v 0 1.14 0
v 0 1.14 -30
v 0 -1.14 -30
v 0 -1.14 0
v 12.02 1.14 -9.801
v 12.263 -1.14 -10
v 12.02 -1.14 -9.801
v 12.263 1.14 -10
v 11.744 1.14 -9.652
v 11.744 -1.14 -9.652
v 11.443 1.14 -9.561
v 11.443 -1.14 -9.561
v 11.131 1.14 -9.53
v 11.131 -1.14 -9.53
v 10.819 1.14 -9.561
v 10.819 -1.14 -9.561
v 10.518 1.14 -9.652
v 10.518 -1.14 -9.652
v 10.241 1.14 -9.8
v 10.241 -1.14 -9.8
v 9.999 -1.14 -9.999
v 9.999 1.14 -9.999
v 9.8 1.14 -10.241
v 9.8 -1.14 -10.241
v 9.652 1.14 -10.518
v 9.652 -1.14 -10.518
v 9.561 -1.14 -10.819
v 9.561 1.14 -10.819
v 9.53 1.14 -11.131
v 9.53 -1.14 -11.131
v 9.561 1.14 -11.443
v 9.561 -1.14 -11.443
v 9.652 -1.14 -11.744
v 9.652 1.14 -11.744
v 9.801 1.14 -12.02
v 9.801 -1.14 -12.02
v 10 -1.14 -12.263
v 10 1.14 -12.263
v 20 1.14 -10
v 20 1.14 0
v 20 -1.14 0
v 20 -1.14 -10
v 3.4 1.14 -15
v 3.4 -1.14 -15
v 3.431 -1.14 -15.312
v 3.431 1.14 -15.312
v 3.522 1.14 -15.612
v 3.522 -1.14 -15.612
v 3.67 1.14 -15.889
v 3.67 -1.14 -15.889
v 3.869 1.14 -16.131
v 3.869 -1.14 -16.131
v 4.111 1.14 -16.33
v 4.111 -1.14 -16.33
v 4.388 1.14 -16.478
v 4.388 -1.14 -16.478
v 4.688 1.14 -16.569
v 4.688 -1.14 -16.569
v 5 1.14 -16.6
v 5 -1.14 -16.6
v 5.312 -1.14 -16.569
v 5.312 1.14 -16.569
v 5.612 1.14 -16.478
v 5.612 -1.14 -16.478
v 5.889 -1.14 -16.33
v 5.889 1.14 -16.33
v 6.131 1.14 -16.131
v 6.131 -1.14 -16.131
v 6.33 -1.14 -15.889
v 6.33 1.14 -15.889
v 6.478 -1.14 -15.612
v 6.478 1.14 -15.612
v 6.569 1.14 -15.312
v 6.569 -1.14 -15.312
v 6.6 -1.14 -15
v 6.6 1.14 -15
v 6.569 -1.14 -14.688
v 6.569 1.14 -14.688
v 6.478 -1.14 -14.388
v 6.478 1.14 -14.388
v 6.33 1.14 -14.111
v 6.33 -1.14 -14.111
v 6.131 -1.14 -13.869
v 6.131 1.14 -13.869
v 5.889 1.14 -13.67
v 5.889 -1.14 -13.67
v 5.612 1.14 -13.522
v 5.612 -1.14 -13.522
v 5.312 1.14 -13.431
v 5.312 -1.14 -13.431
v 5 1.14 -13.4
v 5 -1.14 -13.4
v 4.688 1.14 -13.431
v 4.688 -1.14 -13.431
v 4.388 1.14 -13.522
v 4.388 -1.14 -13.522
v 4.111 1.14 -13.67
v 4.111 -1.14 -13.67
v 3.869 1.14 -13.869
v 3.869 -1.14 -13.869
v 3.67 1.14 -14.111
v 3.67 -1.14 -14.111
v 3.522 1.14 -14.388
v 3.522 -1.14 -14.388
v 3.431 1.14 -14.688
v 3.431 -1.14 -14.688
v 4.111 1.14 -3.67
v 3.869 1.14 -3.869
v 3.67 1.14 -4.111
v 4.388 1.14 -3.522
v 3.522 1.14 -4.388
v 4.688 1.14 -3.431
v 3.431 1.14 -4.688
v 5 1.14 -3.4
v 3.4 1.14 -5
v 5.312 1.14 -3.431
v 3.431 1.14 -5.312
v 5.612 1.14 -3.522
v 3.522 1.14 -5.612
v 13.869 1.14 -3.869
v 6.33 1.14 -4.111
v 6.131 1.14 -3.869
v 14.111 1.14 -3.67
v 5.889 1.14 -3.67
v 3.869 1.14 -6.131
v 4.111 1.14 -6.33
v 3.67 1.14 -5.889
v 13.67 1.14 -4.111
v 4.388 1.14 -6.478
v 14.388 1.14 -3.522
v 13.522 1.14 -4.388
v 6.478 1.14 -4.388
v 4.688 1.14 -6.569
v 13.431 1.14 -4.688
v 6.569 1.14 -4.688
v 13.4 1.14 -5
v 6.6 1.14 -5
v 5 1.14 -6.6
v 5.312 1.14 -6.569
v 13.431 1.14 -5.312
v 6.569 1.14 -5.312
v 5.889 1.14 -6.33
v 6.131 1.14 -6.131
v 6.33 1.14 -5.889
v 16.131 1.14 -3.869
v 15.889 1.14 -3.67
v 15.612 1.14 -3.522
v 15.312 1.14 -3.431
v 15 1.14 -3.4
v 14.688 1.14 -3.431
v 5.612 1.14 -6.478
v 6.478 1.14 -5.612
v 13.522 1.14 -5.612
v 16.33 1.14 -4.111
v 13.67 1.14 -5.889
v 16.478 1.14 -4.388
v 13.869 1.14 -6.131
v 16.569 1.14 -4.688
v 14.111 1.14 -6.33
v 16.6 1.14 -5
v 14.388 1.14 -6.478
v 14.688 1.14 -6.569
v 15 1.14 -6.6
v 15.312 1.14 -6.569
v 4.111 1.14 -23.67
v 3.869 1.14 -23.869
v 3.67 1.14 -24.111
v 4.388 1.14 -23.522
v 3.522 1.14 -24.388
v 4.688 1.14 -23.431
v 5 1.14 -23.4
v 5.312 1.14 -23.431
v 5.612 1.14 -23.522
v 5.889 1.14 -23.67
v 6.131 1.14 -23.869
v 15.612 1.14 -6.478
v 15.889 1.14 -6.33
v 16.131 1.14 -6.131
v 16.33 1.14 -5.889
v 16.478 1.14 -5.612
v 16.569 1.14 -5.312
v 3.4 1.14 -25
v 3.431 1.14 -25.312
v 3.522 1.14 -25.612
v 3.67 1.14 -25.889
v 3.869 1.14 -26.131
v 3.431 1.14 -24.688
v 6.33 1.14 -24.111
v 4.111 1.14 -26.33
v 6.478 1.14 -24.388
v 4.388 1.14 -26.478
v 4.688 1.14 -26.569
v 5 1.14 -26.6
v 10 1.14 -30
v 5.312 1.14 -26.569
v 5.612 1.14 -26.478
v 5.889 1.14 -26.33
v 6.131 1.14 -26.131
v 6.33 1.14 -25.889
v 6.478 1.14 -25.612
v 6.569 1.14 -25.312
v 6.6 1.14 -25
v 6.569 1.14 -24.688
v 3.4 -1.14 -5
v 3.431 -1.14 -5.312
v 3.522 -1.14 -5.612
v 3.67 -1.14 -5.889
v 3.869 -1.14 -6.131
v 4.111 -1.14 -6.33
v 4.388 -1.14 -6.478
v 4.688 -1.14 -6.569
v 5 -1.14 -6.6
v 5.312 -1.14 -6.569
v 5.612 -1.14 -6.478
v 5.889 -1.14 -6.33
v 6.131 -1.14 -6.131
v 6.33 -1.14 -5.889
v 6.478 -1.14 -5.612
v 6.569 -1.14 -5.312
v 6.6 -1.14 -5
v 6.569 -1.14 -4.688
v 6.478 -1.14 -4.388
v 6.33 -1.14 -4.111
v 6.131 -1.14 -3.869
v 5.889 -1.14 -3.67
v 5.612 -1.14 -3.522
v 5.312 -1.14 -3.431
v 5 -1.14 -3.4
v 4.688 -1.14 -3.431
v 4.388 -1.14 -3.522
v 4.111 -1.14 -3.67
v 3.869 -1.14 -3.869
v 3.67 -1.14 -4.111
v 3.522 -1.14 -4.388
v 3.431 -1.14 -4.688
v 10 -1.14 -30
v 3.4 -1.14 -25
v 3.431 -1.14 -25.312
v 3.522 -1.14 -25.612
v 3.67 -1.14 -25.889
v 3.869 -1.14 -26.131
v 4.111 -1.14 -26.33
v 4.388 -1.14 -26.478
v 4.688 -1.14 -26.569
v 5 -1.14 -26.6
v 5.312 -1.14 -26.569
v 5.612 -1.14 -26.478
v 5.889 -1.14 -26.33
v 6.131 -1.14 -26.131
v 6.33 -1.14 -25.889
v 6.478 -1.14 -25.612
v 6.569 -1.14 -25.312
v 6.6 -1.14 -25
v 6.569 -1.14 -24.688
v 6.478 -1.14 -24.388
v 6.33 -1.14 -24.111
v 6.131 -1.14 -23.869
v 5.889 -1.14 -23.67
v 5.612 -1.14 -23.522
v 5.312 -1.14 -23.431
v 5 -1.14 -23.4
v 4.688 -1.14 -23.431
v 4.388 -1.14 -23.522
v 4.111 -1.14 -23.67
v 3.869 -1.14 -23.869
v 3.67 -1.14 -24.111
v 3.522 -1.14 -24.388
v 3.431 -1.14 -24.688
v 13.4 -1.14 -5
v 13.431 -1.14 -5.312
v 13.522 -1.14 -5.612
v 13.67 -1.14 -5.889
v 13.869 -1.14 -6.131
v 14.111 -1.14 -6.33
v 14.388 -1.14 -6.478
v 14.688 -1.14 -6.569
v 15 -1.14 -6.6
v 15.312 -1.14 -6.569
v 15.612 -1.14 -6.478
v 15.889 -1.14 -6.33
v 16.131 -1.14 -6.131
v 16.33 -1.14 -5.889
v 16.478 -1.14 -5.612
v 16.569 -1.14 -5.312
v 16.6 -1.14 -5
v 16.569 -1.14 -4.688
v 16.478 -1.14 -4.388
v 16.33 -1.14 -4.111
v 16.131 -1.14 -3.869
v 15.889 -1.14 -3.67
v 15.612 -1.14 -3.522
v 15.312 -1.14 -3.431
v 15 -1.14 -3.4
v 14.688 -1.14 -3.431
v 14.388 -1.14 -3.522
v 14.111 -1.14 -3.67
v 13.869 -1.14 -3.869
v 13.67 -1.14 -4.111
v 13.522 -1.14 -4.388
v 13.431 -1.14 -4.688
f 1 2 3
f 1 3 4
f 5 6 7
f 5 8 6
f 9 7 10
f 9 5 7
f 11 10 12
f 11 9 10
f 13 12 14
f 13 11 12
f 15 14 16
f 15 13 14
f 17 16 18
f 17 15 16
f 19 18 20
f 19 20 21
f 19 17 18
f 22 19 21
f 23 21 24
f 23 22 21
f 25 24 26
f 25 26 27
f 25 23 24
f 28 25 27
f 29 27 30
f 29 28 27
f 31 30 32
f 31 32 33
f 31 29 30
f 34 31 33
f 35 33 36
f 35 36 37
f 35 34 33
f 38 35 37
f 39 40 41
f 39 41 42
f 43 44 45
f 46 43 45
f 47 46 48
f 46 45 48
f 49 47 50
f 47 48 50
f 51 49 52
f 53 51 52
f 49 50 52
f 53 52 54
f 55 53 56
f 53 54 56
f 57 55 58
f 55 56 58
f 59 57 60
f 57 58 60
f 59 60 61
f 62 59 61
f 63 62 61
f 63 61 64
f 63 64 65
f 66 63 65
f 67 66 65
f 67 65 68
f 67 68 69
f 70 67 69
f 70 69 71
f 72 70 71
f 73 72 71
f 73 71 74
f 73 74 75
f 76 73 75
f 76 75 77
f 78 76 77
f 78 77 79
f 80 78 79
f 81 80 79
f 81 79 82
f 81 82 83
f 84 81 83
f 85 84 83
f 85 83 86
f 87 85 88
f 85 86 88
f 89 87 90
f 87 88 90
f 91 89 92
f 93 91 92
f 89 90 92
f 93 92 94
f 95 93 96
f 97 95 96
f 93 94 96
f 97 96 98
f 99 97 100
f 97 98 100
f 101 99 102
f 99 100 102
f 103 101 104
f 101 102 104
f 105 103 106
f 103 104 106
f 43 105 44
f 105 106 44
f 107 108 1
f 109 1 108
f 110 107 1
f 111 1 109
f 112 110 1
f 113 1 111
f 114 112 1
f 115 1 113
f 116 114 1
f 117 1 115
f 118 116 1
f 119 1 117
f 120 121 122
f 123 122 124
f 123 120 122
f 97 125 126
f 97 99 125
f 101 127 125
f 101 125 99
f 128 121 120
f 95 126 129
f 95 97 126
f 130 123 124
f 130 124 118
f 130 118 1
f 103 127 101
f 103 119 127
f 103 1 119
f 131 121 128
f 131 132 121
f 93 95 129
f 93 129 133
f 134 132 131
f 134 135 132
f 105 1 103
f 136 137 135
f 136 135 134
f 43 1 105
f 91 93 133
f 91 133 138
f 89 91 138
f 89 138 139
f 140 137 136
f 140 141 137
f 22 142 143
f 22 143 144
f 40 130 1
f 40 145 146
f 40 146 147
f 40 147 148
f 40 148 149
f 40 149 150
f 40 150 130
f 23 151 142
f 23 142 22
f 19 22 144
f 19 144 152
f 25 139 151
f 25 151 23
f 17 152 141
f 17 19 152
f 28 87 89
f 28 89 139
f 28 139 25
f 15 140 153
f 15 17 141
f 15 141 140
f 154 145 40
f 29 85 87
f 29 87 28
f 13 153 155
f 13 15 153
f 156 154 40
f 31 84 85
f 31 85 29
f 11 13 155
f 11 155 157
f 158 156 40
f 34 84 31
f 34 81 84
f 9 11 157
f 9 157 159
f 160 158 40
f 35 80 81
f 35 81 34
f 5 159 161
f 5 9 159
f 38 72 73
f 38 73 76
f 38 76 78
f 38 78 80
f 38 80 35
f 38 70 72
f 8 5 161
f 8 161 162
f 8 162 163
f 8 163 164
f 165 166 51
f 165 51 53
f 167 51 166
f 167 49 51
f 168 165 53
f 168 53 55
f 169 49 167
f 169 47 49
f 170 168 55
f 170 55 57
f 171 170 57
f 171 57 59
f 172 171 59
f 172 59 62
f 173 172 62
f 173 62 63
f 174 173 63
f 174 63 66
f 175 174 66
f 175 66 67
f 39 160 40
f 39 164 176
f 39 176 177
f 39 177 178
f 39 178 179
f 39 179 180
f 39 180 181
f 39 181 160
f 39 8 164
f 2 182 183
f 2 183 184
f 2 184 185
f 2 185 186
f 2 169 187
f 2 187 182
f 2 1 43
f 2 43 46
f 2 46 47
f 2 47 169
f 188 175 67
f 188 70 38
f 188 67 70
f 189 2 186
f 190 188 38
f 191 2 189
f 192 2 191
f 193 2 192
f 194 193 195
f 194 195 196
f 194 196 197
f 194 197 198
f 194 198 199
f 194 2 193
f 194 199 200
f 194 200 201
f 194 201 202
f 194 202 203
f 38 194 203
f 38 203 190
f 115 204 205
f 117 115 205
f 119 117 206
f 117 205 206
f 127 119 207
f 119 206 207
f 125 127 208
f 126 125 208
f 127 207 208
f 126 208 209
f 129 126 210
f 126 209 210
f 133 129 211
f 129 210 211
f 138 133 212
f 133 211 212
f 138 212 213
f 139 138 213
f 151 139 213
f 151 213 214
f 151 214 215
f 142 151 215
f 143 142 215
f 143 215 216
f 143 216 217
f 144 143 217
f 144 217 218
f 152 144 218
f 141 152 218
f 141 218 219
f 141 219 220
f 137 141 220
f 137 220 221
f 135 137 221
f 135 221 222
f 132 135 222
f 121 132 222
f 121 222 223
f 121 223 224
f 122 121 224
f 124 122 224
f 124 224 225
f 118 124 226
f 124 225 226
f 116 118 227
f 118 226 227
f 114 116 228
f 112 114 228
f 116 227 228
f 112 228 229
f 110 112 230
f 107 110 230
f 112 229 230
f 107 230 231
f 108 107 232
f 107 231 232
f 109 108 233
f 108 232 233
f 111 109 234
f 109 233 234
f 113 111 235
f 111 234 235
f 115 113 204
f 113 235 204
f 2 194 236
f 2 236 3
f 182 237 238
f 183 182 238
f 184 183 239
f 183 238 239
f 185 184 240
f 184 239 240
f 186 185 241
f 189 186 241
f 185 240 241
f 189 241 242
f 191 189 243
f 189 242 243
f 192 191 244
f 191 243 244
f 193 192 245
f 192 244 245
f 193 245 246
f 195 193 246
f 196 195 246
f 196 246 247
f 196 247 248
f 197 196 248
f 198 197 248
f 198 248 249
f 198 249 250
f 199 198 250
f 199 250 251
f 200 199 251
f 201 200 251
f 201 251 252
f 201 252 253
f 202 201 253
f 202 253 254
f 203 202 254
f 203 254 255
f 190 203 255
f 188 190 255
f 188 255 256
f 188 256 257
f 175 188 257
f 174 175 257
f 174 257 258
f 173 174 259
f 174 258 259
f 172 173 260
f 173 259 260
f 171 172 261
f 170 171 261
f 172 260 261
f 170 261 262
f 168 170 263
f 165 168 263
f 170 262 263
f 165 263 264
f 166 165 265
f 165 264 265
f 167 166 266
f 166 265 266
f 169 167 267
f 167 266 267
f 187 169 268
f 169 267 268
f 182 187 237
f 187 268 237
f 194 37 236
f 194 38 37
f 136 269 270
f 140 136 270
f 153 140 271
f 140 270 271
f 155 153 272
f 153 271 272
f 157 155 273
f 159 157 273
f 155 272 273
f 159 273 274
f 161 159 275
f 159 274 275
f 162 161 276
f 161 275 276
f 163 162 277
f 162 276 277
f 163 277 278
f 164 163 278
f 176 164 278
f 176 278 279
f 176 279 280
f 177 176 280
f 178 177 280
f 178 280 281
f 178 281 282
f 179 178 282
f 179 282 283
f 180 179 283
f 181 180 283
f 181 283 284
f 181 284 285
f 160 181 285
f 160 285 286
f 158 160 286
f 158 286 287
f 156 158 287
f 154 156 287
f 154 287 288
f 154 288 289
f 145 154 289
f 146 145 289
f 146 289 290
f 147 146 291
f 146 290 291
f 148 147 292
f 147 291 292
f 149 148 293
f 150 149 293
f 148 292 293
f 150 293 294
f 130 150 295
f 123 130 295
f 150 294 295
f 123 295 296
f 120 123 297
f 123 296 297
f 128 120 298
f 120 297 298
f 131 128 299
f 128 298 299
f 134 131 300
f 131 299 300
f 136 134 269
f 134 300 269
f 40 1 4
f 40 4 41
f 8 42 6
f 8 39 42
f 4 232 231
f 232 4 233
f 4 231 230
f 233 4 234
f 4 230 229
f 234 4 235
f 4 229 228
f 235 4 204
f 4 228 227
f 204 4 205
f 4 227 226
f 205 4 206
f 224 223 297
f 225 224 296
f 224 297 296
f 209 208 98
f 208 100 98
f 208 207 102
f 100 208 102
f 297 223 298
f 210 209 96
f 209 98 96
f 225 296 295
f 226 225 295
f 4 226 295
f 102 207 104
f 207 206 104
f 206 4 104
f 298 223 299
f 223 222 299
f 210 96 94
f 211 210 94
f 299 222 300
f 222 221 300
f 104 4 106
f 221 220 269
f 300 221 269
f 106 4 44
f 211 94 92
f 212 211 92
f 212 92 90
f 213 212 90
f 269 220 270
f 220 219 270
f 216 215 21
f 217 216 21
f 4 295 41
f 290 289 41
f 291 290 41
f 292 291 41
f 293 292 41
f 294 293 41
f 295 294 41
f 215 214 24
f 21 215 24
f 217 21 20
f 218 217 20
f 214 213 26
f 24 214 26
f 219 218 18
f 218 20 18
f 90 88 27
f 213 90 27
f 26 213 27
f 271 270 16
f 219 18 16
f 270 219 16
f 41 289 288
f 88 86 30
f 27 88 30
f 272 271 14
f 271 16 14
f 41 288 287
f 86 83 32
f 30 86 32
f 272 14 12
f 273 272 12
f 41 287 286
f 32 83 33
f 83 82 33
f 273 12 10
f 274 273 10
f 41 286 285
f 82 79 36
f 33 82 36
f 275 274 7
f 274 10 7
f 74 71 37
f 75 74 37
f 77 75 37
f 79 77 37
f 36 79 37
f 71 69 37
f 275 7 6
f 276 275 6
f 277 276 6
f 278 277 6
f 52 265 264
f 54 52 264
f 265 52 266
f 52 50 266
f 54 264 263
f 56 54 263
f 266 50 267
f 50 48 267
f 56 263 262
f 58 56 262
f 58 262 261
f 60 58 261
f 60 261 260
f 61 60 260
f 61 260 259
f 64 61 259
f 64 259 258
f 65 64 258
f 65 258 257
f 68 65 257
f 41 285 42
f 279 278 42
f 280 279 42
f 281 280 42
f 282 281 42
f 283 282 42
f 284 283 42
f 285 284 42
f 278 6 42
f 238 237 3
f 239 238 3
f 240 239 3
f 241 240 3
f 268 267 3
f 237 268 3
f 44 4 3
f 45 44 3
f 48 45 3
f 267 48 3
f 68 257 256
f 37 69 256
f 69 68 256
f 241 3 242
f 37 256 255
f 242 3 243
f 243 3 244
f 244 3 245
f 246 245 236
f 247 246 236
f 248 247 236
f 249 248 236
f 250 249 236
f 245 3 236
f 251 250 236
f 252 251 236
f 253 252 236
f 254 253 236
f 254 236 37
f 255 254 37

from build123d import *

# Parameters (mm, degrees)
BOSS_EXTRUDE1_DEPTH            = 1.14
F_3_2_3_2_DIAMETER_HOLE1_D     = 3.2
F_3_2_3_2_DIAMETER_HOLE1_DEPTH = 10
F_3_2_3_2_DIAMETER_HOLE1_TIP   = 0.96137699


with BuildPart() as part:
    # Sketch1 → Boss-Extrude1 (new body, symmetric)
    with BuildSketch(Plane(origin=(0, 0, 2279.99997139), x_dir=(1, 0, 0), z_dir=(0, 1, 0))):
        with BuildLine():
            Line((10, 2292.262711431), (10, 2309.99997139))
            Line((10, 2309.99997139), (0, 2309.99997139))
            Line((0, 2309.99997139), (0, 2279.99997139))
            Line((0, 2279.99997139), (20, 2279.99997139))
            Line((20, 2279.99997139), (20, 2289.99997139))
            Line((20, 2289.99997139), (12.262740041, 2289.99997139))
            ThreePointArc((12.262740041, 2289.99997139), (9.99862915, 2289.99860054), (10, 2292.262711431))
        make_face()
    extrude(amount=BOSS_EXTRUDE1_DEPTH, both=True)

    # Ø3.2 (3.2) Diameter Hole1
    with Locations(Plane(origin=(0, 1.14, 0), x_dir=(1, 0, 0), z_dir=(0, 1, 0))):
        with Locations((5, 25), (5, 5), (15, 5), (5, 15)):
            Hole(F_3_2_3_2_DIAMETER_HOLE1_D / 2, depth=F_3_2_3_2_DIAMETER_HOLE1_DEPTH)
            with Locations((0, 0, -(F_3_2_3_2_DIAMETER_HOLE1_DEPTH + F_3_2_3_2_DIAMETER_HOLE1_TIP / 2))):  # 118° drill point
                Cone(0, F_3_2_3_2_DIAMETER_HOLE1_D / 2, F_3_2_3_2_DIAMETER_HOLE1_TIP, mode=Mode.SUBTRACT)


solid = part.part
